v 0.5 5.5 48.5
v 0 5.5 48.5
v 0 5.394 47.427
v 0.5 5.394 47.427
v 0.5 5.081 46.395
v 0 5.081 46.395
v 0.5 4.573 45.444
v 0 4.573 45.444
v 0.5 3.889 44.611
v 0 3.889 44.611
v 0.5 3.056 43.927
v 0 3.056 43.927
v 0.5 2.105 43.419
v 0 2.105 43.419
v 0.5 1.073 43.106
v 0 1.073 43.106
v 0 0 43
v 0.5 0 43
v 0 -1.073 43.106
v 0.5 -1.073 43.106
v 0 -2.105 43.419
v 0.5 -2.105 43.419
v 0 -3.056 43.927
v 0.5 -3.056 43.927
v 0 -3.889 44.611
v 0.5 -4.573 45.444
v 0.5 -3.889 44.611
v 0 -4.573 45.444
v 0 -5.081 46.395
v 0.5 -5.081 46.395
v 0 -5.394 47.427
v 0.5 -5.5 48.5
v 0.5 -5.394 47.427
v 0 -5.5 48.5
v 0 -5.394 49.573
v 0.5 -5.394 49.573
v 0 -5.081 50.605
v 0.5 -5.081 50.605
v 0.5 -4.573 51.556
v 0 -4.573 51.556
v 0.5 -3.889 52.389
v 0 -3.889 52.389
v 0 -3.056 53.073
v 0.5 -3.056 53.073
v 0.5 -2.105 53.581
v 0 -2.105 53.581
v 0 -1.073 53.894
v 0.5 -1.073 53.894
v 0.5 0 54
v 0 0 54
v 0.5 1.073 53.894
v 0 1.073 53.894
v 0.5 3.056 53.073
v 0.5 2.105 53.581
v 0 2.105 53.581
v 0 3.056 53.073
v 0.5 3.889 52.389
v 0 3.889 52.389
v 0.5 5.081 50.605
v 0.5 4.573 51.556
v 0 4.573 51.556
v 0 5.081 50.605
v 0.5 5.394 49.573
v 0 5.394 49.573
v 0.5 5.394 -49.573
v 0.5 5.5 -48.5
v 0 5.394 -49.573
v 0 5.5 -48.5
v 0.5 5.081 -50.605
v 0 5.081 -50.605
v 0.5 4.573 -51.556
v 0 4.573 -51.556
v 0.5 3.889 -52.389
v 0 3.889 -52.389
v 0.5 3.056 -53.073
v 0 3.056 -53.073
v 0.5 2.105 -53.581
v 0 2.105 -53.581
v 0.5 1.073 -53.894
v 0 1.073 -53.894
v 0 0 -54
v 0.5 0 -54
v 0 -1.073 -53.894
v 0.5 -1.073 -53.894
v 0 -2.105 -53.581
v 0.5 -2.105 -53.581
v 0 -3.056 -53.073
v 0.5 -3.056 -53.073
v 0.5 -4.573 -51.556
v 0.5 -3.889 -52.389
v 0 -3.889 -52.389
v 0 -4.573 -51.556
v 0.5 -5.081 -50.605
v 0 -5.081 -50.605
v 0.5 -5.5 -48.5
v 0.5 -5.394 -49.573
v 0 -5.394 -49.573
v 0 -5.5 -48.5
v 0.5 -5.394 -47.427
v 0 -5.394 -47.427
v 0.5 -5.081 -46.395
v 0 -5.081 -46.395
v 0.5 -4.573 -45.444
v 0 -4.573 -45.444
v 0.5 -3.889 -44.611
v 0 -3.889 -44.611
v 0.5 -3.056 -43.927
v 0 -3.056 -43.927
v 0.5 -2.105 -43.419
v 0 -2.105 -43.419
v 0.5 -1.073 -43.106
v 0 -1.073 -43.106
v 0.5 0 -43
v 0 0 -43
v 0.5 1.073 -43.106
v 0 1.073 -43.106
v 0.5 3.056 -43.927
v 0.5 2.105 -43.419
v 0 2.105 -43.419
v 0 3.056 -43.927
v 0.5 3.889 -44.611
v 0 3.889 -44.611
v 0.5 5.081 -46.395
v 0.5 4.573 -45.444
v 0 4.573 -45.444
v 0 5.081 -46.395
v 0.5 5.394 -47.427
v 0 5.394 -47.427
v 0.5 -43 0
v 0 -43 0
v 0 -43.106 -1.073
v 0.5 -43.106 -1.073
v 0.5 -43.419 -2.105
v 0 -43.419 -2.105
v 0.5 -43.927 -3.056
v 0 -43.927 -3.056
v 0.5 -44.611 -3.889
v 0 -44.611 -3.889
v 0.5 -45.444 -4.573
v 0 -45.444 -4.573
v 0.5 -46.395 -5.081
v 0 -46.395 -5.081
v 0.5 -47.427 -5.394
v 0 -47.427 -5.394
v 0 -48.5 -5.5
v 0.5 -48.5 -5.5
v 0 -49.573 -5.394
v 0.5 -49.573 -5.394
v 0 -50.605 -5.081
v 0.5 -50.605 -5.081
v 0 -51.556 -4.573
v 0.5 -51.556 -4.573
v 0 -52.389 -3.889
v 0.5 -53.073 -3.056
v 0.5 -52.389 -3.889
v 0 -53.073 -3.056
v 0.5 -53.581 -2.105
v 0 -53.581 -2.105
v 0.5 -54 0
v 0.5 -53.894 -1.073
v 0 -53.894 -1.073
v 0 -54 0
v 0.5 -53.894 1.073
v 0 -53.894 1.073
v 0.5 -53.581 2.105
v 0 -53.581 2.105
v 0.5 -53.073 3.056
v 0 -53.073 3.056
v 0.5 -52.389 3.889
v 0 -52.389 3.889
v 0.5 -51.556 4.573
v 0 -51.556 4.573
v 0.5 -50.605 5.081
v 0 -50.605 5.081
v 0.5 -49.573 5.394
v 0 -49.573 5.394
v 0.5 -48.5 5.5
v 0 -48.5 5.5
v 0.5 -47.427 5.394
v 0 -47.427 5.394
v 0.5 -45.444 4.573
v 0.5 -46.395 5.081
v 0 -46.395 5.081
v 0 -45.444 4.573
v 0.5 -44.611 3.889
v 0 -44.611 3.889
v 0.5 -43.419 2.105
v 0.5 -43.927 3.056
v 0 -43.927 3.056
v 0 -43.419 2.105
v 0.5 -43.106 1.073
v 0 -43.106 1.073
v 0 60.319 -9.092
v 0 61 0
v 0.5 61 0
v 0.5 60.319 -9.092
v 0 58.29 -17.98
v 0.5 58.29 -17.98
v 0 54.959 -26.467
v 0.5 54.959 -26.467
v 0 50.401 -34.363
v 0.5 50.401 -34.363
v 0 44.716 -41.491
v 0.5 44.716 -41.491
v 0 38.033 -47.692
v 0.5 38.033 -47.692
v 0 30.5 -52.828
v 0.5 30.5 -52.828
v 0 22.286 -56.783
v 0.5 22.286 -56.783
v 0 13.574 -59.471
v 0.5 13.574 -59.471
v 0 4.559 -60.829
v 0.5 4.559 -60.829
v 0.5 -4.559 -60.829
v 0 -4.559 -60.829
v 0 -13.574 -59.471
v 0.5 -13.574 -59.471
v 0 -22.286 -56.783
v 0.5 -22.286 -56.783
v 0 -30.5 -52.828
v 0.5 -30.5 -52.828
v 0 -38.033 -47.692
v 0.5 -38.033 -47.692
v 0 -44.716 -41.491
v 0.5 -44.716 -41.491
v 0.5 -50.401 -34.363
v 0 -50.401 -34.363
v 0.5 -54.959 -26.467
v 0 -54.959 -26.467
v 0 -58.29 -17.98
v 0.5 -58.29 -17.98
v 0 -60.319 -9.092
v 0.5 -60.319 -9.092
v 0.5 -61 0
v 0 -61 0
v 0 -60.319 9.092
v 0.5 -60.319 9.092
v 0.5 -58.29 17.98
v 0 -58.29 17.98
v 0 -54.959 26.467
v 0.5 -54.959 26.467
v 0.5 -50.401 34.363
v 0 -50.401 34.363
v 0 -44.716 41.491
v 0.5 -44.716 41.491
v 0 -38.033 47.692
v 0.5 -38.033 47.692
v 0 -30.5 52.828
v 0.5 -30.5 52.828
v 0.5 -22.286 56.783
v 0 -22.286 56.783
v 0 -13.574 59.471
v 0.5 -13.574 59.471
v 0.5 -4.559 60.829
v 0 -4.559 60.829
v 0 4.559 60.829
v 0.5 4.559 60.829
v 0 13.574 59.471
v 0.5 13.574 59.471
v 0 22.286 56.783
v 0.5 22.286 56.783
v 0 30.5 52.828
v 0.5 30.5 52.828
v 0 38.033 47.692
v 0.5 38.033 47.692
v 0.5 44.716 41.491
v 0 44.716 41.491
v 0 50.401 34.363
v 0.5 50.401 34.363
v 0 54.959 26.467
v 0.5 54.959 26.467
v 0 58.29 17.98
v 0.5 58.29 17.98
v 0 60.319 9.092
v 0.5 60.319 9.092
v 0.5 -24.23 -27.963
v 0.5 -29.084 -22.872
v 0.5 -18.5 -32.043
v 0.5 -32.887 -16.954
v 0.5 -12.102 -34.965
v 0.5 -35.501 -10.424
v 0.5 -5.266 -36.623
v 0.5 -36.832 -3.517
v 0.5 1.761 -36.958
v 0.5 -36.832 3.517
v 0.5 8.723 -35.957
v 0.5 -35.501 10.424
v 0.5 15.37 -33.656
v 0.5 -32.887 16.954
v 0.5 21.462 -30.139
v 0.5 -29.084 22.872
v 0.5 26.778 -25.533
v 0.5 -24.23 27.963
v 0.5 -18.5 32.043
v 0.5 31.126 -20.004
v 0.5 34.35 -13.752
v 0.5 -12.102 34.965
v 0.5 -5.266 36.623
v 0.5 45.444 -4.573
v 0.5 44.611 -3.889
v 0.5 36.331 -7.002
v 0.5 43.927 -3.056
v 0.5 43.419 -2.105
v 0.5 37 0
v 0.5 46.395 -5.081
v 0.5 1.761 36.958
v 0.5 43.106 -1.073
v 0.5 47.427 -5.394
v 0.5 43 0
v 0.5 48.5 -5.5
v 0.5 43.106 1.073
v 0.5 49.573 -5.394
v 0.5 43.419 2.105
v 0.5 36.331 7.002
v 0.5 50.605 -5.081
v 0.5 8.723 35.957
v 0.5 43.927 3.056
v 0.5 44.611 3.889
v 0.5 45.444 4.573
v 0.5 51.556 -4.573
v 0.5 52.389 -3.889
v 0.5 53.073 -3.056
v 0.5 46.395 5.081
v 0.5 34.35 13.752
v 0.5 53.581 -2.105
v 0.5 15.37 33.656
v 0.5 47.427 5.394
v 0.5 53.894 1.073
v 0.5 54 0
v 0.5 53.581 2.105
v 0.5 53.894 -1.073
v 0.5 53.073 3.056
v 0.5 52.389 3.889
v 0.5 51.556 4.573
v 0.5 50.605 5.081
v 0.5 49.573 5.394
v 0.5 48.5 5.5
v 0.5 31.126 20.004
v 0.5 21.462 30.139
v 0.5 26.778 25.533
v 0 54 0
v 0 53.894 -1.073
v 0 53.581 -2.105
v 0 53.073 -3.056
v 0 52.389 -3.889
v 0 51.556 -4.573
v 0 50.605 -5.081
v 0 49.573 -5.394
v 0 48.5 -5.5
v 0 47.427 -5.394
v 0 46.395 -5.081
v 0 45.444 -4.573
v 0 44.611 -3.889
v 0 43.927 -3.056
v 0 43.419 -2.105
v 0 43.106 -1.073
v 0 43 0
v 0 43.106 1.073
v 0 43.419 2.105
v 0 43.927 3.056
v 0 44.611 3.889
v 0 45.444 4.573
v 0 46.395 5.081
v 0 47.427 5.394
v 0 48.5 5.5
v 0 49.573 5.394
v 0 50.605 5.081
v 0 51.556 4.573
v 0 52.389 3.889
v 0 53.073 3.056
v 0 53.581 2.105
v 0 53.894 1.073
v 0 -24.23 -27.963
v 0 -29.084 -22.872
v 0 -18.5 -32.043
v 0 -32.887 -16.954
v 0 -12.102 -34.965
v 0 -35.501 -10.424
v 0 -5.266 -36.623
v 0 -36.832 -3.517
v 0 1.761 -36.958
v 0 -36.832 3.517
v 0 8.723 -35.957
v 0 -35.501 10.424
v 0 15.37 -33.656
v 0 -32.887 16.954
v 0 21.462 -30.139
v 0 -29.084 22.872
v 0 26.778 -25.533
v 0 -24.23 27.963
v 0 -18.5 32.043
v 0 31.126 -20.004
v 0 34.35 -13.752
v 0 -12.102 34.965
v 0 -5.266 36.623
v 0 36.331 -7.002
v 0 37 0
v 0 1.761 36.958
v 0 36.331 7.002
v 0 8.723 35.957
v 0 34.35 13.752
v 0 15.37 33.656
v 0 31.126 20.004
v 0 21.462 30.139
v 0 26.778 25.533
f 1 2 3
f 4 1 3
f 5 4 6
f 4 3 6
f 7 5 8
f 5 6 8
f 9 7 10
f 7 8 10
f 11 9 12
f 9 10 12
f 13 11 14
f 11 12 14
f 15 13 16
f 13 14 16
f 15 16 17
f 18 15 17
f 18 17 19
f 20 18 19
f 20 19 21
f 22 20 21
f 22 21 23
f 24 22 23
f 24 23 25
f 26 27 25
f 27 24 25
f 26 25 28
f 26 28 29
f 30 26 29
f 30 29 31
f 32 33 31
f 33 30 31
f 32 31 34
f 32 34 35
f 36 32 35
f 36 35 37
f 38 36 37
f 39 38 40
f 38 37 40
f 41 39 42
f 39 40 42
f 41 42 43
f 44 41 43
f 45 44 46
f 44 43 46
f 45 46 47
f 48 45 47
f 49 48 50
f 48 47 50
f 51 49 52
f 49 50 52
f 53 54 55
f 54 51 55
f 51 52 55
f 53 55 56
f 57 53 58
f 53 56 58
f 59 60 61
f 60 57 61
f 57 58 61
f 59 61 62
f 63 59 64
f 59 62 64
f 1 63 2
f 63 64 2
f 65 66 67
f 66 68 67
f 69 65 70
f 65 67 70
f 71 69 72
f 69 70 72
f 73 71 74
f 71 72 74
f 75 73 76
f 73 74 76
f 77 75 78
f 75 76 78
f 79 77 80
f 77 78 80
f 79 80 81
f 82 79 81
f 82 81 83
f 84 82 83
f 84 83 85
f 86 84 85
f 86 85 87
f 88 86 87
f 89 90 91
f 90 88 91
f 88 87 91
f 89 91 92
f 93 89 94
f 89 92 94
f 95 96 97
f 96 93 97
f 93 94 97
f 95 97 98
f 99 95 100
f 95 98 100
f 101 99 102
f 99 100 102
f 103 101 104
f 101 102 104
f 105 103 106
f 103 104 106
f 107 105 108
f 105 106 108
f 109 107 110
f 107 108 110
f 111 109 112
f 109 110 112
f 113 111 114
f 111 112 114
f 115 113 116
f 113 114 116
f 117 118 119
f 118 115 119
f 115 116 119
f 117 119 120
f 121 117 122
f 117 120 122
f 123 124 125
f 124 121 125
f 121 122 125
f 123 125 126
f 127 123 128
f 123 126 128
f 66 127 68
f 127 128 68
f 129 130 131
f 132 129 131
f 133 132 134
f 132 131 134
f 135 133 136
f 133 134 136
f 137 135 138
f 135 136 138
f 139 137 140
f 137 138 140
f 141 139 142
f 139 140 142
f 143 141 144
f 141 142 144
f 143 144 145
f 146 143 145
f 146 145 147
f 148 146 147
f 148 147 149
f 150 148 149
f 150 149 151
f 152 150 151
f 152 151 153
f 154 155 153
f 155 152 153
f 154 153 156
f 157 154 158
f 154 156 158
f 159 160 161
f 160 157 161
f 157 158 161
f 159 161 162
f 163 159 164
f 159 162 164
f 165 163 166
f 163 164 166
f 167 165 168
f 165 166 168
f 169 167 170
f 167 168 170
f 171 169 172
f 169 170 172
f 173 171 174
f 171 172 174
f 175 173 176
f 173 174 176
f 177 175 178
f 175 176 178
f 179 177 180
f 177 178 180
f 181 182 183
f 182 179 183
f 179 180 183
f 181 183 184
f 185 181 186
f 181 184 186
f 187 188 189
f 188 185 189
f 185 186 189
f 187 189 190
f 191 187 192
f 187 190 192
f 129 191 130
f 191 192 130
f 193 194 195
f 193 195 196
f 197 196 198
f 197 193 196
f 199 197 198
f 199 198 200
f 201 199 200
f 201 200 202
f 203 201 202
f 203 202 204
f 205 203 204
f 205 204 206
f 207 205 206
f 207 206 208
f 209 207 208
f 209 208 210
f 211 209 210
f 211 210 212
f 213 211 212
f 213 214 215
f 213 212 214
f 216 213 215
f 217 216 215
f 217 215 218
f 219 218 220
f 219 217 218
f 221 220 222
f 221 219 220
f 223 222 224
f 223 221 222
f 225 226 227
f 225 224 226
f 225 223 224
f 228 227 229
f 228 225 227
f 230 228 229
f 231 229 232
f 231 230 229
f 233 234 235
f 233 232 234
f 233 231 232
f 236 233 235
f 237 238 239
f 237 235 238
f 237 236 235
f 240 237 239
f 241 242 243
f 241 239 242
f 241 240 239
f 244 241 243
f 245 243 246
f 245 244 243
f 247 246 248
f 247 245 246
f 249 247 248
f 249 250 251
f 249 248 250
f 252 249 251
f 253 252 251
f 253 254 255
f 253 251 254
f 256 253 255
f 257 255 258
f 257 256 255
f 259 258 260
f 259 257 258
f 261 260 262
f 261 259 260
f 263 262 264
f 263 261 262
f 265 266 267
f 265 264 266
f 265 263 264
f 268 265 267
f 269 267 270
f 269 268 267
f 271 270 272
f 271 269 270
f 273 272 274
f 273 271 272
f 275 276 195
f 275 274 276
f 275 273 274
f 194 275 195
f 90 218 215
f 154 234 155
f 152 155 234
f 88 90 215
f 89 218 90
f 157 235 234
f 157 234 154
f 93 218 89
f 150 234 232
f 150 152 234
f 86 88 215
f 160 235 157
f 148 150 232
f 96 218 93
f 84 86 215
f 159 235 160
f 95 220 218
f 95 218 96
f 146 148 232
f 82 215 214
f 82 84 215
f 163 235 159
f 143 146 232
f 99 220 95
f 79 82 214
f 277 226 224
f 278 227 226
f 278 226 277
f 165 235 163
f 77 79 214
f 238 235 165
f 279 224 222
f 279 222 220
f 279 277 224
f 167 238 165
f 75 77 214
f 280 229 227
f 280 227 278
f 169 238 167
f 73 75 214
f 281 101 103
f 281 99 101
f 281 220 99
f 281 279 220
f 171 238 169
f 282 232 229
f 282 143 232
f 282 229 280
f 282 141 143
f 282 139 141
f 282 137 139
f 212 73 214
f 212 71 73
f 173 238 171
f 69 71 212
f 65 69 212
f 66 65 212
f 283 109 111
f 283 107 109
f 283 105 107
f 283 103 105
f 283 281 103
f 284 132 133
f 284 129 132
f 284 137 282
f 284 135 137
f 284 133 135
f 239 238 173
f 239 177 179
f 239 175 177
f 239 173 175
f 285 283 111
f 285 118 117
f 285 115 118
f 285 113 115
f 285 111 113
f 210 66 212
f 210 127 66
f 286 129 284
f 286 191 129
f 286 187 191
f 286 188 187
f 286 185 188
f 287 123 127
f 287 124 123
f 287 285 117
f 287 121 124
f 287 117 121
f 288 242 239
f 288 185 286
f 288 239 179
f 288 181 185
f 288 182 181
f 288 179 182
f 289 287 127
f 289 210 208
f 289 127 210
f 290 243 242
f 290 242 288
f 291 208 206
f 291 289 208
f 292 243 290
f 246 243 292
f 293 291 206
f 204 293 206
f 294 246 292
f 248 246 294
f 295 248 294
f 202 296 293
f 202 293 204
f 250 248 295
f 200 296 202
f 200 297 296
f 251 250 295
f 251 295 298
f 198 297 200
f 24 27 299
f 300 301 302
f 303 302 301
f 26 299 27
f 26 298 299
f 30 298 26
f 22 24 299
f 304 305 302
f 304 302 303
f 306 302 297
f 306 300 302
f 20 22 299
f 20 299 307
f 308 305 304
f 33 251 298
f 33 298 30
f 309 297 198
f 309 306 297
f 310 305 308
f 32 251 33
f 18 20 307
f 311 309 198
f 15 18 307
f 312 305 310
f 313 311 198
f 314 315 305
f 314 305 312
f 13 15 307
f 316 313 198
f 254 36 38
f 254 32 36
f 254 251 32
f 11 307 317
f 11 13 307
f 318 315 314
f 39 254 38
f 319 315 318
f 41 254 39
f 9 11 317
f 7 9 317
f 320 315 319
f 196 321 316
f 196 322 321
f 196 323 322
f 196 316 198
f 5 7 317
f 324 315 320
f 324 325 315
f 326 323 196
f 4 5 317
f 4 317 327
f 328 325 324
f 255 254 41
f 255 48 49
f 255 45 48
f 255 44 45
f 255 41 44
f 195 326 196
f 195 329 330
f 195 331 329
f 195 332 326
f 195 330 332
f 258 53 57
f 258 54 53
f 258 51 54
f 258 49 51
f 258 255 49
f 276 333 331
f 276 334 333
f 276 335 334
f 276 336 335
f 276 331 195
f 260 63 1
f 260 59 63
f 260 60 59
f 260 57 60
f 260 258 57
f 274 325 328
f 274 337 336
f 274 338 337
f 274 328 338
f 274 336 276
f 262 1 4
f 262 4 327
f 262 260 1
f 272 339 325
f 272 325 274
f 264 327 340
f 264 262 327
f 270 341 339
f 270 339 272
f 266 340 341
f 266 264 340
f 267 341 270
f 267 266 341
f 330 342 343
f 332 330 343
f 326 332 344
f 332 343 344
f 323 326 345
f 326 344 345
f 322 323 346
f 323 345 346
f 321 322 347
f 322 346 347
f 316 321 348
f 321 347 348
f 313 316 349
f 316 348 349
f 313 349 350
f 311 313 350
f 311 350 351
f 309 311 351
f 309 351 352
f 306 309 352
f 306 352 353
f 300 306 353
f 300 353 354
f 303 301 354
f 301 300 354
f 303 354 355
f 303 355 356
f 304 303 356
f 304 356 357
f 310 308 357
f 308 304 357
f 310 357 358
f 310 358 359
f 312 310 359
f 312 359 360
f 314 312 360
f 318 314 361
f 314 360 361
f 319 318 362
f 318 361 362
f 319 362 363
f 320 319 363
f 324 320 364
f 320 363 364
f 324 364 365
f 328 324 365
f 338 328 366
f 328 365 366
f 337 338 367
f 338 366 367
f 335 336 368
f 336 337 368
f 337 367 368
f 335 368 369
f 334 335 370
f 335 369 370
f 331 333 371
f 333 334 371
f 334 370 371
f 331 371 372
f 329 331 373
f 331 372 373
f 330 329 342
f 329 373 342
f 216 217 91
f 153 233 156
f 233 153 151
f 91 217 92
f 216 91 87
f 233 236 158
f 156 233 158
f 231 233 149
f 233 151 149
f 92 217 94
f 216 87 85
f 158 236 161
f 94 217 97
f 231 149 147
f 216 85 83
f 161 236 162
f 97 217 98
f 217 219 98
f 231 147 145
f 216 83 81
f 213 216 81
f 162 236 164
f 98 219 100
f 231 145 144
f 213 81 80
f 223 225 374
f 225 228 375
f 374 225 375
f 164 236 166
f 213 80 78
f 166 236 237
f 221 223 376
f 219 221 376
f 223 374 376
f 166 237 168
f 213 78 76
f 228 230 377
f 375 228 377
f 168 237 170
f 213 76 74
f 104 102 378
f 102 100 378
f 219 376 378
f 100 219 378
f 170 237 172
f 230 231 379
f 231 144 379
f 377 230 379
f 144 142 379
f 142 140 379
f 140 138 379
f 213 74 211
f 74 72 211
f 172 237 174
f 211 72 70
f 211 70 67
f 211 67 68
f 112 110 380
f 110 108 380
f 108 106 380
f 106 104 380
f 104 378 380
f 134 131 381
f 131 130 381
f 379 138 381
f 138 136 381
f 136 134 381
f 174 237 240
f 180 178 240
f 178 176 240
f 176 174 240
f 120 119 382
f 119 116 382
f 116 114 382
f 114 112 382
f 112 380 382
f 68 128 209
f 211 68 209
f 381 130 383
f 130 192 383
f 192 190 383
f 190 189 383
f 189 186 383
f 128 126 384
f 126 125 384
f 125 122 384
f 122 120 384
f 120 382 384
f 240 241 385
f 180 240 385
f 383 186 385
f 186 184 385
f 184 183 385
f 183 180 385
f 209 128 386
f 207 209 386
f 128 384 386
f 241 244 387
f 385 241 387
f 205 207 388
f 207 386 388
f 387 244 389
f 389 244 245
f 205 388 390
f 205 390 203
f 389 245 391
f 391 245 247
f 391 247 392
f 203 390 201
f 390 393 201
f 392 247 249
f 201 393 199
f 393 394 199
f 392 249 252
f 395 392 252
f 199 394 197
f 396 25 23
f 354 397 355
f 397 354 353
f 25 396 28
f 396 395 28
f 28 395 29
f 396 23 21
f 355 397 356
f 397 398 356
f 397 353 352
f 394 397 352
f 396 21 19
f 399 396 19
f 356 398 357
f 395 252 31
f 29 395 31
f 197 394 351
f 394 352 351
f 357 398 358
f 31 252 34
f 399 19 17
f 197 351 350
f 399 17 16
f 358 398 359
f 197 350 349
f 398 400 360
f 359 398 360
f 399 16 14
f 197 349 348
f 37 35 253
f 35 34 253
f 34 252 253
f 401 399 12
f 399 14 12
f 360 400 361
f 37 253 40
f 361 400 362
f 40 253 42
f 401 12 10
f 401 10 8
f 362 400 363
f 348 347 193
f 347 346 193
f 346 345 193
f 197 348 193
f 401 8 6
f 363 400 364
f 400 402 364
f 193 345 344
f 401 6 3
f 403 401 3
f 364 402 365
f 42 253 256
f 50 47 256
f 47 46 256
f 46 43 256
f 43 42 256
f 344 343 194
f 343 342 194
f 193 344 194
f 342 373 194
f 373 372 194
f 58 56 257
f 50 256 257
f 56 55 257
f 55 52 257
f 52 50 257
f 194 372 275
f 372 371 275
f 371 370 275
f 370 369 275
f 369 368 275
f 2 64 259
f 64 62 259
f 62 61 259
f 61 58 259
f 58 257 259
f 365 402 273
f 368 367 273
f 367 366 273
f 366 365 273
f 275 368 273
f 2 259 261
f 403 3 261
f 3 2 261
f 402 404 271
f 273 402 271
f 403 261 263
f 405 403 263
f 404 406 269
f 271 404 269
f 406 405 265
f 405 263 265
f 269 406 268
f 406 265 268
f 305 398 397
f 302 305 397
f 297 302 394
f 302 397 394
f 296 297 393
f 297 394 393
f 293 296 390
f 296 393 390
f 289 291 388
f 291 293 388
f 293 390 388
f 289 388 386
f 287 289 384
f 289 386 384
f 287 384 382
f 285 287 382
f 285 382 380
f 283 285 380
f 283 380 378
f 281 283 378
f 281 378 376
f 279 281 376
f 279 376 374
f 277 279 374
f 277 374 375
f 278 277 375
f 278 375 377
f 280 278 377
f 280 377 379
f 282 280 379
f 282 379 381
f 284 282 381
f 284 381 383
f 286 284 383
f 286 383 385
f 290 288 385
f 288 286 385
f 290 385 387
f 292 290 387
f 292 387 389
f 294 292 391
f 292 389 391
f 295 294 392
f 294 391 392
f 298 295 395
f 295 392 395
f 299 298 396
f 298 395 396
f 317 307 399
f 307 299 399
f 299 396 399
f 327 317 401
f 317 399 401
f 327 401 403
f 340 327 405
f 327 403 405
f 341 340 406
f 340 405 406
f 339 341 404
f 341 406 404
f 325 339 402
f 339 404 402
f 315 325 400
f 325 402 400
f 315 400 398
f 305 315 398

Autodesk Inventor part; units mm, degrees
ref_plane "YZ Plane" through (0, 0, 0) normal (1, 0, 0) x (0, 1, 0)
ref_plane "XZ Plane" through (0, 0, 0) normal (0, 1, 0) x (-1, 0, 0)
ref_plane "XY Plane" through (0, 0, 0) normal (0, 0, 1) x (1, 0, 0)
sketch "草图1" plane through (0, 0, 0) normal (1, 0, 0) x (0, 1, 0)
  circle A0 centre (0, 0) radius 61
  circle A1 centre (0, 0) radius 37
  circle A2 centre (48.5, 0) radius 5.5
  circle A3 centre (0, 48.5) radius 5.5
  circle A4 centre (-48.5, 0) radius 5.5
  circle A5 centre (0, -48.5) radius 5.5
  dimension "d1" = 122
  dimension "d3" = 74
  dimension "d4" = 11
  dimension "d5" = 48.5
  dimension "d8" = 360
extrude "拉伸1" add sketch "草图1" along normal blind 0.5
equation "\"d1\" = D2"
equation "\"d3\" = d2"
equation "\"d4\" = d0"
equation "\"d5\" = 0.5 * D0"
equation "\"d10\" = b"
equation "\"b\" = 0.5"
equation "\"d0\" = 11"
equation "\"D0\" = 97"
equation "\"d2\" = 74"
equation "\"D2\" = 122"
properties part number "中间轴承调整垫片" material "铜，锻铸"
